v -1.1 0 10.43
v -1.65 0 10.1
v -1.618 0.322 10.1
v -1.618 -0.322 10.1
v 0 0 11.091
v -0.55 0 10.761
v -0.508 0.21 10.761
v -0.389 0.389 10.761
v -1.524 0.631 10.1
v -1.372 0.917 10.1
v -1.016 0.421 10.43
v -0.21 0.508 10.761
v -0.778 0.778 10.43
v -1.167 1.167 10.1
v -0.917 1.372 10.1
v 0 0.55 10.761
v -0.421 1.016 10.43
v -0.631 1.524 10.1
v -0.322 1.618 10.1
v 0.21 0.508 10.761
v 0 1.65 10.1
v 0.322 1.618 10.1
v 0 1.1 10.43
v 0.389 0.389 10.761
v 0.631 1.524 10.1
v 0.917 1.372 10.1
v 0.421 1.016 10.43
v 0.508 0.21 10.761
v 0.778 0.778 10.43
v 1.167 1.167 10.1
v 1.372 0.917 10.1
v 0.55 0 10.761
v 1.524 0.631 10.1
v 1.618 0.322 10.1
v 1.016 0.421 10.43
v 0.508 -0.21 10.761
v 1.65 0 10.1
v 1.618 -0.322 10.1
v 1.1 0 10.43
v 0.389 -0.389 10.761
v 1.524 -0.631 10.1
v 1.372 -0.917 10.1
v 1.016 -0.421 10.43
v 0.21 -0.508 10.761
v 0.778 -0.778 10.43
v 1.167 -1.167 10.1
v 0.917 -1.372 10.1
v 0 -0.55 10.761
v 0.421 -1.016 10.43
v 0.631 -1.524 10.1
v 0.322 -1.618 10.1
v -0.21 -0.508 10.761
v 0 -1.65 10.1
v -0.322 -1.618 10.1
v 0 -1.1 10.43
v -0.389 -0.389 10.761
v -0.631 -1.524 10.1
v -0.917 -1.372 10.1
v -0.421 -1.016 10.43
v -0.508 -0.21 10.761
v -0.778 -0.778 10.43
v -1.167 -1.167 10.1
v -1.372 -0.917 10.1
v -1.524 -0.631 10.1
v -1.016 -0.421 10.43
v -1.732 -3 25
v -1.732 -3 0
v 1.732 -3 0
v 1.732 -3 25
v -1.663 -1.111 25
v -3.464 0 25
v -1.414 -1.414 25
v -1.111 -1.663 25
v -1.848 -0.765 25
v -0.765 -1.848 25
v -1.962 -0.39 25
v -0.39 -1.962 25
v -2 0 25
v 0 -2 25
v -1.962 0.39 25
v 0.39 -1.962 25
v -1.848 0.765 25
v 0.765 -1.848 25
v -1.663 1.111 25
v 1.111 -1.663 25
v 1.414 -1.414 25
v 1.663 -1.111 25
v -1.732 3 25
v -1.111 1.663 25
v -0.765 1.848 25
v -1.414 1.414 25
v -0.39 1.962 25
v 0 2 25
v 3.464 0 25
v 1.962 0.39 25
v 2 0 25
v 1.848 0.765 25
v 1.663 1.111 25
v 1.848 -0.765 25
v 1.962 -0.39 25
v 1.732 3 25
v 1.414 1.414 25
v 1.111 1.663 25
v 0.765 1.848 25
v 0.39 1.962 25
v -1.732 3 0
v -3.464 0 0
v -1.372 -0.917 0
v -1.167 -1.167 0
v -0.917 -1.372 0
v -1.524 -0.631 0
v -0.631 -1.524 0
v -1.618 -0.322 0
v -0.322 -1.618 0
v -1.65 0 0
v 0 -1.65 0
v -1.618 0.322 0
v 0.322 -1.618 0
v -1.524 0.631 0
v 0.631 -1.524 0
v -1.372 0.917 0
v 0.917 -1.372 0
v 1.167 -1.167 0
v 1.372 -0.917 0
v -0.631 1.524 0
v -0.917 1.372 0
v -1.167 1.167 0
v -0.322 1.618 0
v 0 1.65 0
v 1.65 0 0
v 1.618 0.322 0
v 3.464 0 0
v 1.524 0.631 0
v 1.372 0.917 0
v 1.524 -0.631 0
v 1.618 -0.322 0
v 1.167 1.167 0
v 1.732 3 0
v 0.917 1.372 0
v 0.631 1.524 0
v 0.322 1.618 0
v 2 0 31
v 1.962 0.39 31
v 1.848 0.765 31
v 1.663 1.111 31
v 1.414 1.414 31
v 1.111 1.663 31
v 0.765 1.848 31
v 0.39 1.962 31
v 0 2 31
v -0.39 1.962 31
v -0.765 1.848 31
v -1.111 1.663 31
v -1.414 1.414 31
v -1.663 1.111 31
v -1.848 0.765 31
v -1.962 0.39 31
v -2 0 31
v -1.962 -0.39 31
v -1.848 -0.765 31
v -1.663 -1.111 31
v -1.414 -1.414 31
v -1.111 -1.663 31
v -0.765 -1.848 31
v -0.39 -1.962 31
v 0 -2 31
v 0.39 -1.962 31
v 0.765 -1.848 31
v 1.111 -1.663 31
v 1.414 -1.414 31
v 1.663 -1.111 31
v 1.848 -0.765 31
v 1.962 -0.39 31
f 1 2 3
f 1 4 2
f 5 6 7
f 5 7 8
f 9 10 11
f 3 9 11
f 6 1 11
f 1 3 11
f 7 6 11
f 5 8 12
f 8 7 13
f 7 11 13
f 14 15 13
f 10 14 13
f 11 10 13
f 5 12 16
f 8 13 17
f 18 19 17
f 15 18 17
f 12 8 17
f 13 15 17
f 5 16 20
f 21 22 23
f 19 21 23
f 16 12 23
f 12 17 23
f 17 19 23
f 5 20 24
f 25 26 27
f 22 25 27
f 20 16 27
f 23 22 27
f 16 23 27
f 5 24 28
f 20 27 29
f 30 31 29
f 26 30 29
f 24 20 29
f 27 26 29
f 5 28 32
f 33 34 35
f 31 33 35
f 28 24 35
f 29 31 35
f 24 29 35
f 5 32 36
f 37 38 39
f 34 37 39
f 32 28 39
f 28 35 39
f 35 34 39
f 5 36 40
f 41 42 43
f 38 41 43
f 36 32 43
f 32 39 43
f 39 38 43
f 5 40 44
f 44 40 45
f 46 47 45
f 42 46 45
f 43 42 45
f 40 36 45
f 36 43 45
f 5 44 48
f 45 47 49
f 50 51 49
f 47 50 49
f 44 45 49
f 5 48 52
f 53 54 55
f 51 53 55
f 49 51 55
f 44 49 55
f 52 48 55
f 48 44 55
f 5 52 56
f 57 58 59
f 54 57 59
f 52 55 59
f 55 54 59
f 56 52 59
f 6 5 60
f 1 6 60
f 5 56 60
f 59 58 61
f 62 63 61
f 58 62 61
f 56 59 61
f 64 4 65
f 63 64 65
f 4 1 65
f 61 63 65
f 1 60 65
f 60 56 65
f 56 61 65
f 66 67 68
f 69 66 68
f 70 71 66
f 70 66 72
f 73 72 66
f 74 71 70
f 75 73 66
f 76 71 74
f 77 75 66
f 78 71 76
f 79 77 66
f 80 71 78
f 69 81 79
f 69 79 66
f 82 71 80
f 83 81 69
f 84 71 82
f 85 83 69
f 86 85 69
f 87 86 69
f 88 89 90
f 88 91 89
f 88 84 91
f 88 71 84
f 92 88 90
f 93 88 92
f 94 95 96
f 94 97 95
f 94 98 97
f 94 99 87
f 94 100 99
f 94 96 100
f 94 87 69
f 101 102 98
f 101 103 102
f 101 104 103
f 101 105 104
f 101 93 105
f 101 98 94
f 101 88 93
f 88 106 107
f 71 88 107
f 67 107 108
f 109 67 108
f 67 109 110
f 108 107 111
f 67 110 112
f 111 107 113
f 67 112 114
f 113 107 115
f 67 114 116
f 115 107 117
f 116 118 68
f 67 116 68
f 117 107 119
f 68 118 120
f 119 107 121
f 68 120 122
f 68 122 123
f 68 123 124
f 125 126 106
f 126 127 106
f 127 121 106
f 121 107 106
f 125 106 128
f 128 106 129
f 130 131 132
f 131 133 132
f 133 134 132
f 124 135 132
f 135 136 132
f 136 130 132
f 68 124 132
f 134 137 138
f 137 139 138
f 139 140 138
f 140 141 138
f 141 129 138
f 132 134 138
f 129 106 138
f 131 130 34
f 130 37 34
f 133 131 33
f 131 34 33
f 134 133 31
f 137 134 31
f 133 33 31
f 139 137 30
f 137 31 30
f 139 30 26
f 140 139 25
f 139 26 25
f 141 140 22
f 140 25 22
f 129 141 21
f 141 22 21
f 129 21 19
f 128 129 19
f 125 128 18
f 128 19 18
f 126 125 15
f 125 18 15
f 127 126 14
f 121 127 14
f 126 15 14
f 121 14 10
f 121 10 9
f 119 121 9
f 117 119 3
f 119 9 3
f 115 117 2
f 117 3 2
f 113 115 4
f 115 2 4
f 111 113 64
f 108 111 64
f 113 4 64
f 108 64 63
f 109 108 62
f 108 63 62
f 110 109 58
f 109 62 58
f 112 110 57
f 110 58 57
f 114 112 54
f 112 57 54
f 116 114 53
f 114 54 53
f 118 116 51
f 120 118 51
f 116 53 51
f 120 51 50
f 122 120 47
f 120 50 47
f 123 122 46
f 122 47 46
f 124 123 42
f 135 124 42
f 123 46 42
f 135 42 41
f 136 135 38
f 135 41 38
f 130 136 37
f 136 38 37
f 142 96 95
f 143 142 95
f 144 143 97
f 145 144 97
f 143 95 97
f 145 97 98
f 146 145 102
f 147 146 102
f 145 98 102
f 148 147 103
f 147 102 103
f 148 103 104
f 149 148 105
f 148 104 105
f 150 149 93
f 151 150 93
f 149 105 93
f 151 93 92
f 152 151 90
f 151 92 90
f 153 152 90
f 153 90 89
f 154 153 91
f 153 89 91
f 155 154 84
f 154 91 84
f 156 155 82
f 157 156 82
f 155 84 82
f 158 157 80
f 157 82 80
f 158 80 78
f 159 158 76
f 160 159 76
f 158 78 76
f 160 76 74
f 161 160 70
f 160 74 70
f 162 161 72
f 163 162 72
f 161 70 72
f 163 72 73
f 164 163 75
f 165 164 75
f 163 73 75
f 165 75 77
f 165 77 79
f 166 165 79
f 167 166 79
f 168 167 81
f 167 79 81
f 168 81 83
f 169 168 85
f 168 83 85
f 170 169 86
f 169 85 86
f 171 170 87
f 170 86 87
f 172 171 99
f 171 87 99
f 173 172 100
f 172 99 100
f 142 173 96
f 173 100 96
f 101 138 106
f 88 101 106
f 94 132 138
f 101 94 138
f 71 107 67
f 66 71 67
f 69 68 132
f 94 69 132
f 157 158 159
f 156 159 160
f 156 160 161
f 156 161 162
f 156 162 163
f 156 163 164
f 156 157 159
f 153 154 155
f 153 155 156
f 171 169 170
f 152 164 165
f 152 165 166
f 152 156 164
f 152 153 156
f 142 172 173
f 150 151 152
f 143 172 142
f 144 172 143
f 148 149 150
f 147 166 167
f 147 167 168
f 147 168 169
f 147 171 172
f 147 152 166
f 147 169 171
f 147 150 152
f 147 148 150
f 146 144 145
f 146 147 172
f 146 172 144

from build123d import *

# Parameters (mm, degrees)
BOSS_EXTRUDE1_DEPTH       = 25
SKETCH2_R                 = 2
BOSS_EXTRUDE2_DEPTH       = 6
M4X0_7_TAPPED_HOLE1_D     = 3.3
M4X0_7_TAPPED_HOLE1_DEPTH = 10.1
M4X0_7_TAPPED_HOLE1_TIP   = 0.991420021


with BuildPart() as part:
    # Sketch1 → Boss-Extrude1 (new body)
    with BuildSketch(Plane.XY):
        Polygon((3.464101615, 0), (1.732050808, 3), (-1.732050808, 3), (-3.464101615, 0), (-1.732050808, -3), (1.732050808, -3), align=None)
    extrude(amount=BOSS_EXTRUDE1_DEPTH)

    # Sketch2 → Boss-Extrude2 (add)
    with BuildSketch(Plane.XY.offset(25)):
        Circle(SKETCH2_R)
    extrude(amount=BOSS_EXTRUDE2_DEPTH)

    # M4x0.7 Tapped Hole1
    with Locations(Plane(origin=(0, 0, 0), x_dir=(-1, 0, 0), z_dir=(0, 0, -1))):
        with Locations((0, 0)):
            Hole(M4X0_7_TAPPED_HOLE1_D / 2, depth=M4X0_7_TAPPED_HOLE1_DEPTH)
            with Locations((0, 0, -(M4X0_7_TAPPED_HOLE1_DEPTH + M4X0_7_TAPPED_HOLE1_TIP / 2))):  # 118° drill point
                Cone(0, M4X0_7_TAPPED_HOLE1_D / 2, M4X0_7_TAPPED_HOLE1_TIP, mode=Mode.SUBTRACT)


solid = part.part
